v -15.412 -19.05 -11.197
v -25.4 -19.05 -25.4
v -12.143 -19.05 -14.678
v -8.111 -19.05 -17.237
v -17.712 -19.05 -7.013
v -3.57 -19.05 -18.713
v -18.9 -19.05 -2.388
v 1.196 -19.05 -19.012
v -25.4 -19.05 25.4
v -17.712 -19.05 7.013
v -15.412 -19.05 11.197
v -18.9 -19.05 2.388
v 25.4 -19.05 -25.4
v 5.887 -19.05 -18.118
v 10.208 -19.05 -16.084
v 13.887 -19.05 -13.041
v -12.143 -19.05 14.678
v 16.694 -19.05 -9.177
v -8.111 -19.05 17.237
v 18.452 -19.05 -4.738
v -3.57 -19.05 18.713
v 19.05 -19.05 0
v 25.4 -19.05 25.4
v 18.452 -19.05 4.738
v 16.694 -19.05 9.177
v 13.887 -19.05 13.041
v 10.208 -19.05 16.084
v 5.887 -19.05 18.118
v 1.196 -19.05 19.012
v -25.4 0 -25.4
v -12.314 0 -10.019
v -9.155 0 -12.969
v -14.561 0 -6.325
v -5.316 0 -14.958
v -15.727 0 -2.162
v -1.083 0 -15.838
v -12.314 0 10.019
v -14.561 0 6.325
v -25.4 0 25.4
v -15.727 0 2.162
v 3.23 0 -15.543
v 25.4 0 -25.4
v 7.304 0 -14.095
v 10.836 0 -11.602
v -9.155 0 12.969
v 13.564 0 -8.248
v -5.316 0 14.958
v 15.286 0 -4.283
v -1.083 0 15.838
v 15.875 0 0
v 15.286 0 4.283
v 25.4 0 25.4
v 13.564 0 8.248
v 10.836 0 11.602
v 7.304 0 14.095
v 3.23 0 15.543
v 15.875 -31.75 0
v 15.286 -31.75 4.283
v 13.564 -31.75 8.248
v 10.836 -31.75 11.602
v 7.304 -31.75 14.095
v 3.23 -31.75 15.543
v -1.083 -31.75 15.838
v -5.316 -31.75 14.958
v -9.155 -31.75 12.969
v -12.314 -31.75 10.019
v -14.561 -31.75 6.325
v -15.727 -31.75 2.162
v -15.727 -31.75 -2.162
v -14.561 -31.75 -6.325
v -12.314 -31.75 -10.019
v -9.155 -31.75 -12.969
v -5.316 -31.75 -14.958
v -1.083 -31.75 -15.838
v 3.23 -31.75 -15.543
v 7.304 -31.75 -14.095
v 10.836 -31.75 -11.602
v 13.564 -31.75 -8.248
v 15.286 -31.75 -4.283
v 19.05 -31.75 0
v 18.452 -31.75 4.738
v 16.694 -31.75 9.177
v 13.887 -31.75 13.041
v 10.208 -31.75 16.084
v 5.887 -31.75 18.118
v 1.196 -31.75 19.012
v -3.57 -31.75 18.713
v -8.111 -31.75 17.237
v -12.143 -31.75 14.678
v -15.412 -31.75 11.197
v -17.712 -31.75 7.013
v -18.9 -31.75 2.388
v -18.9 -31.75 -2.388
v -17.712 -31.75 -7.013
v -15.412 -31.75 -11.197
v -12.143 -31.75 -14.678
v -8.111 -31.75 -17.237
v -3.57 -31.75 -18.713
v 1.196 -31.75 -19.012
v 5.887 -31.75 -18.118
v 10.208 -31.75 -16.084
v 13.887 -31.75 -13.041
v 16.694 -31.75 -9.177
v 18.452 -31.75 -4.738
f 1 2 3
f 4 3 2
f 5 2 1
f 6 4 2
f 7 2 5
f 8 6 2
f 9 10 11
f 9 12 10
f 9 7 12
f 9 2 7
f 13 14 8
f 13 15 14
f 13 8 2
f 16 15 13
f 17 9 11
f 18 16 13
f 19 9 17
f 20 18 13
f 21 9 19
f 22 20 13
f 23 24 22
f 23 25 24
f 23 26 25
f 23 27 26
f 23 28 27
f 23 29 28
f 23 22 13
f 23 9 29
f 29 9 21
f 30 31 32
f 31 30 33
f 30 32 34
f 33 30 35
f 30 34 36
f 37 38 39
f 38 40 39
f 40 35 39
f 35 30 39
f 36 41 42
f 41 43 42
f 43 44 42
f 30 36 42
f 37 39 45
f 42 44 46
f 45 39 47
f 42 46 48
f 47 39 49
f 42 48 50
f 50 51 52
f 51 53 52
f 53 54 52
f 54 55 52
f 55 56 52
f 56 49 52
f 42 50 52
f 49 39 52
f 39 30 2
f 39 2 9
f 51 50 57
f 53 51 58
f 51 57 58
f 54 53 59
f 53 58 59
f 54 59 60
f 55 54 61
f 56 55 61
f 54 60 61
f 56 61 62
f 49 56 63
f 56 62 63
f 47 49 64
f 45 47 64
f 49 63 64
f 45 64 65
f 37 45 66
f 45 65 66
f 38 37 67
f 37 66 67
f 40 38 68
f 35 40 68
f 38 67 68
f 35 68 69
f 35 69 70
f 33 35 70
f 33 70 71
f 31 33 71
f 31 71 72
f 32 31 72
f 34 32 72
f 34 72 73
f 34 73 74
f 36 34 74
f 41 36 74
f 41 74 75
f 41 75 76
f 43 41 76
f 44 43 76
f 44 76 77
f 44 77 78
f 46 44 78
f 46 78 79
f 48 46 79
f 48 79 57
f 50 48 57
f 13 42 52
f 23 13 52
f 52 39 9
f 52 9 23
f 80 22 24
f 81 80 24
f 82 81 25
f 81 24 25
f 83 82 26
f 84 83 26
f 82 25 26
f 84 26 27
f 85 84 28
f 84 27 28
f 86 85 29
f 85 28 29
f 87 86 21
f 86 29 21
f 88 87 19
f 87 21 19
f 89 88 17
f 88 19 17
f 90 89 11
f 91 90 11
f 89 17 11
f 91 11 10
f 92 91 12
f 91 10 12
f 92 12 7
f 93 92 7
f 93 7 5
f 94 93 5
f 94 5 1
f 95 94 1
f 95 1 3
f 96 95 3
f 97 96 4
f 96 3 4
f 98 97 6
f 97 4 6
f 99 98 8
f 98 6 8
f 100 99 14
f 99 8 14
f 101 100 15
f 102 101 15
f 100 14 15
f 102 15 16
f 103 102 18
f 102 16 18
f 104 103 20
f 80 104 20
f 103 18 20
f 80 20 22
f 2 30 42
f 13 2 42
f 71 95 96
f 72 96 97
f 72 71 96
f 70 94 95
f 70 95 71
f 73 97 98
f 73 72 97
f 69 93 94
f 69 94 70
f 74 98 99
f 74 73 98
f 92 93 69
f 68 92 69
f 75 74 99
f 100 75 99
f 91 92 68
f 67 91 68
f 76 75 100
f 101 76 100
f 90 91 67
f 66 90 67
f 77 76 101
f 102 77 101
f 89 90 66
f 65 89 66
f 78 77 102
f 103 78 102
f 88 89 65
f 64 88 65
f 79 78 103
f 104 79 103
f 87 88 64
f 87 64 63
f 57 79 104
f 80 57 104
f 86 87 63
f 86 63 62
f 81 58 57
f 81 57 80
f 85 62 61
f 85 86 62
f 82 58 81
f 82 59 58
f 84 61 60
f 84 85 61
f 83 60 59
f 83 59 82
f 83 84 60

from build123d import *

# Parameters (mm, degrees)
F0_W     = 50.8
F0_H     = 50.8
F1_DEPTH = 19.05
F2_R     = 19.05
F3_DEPTH = 12.7
F4_R     = 15.875
F5_DEPTH = 50.292


with BuildPart() as f1:
    # F0 (on Front) → F1 (new body)
    with BuildSketch(Plane.XZ):
        Rectangle(F0_W, F0_H)
    extrude(amount=F1_DEPTH)

    # F2 (on face) → F3 (join)
    with BuildSketch(Plane.XZ.offset(19.05)):
        Circle(F2_R)
    extrude(amount=F3_DEPTH)

    # F4 (on face) → F5 (cut)
    with BuildSketch(Plane.XZ.offset(31.75)):
        Circle(F4_R)
    extrude(amount=-F5_DEPTH, mode=Mode.SUBTRACT)


solid = f1.part
